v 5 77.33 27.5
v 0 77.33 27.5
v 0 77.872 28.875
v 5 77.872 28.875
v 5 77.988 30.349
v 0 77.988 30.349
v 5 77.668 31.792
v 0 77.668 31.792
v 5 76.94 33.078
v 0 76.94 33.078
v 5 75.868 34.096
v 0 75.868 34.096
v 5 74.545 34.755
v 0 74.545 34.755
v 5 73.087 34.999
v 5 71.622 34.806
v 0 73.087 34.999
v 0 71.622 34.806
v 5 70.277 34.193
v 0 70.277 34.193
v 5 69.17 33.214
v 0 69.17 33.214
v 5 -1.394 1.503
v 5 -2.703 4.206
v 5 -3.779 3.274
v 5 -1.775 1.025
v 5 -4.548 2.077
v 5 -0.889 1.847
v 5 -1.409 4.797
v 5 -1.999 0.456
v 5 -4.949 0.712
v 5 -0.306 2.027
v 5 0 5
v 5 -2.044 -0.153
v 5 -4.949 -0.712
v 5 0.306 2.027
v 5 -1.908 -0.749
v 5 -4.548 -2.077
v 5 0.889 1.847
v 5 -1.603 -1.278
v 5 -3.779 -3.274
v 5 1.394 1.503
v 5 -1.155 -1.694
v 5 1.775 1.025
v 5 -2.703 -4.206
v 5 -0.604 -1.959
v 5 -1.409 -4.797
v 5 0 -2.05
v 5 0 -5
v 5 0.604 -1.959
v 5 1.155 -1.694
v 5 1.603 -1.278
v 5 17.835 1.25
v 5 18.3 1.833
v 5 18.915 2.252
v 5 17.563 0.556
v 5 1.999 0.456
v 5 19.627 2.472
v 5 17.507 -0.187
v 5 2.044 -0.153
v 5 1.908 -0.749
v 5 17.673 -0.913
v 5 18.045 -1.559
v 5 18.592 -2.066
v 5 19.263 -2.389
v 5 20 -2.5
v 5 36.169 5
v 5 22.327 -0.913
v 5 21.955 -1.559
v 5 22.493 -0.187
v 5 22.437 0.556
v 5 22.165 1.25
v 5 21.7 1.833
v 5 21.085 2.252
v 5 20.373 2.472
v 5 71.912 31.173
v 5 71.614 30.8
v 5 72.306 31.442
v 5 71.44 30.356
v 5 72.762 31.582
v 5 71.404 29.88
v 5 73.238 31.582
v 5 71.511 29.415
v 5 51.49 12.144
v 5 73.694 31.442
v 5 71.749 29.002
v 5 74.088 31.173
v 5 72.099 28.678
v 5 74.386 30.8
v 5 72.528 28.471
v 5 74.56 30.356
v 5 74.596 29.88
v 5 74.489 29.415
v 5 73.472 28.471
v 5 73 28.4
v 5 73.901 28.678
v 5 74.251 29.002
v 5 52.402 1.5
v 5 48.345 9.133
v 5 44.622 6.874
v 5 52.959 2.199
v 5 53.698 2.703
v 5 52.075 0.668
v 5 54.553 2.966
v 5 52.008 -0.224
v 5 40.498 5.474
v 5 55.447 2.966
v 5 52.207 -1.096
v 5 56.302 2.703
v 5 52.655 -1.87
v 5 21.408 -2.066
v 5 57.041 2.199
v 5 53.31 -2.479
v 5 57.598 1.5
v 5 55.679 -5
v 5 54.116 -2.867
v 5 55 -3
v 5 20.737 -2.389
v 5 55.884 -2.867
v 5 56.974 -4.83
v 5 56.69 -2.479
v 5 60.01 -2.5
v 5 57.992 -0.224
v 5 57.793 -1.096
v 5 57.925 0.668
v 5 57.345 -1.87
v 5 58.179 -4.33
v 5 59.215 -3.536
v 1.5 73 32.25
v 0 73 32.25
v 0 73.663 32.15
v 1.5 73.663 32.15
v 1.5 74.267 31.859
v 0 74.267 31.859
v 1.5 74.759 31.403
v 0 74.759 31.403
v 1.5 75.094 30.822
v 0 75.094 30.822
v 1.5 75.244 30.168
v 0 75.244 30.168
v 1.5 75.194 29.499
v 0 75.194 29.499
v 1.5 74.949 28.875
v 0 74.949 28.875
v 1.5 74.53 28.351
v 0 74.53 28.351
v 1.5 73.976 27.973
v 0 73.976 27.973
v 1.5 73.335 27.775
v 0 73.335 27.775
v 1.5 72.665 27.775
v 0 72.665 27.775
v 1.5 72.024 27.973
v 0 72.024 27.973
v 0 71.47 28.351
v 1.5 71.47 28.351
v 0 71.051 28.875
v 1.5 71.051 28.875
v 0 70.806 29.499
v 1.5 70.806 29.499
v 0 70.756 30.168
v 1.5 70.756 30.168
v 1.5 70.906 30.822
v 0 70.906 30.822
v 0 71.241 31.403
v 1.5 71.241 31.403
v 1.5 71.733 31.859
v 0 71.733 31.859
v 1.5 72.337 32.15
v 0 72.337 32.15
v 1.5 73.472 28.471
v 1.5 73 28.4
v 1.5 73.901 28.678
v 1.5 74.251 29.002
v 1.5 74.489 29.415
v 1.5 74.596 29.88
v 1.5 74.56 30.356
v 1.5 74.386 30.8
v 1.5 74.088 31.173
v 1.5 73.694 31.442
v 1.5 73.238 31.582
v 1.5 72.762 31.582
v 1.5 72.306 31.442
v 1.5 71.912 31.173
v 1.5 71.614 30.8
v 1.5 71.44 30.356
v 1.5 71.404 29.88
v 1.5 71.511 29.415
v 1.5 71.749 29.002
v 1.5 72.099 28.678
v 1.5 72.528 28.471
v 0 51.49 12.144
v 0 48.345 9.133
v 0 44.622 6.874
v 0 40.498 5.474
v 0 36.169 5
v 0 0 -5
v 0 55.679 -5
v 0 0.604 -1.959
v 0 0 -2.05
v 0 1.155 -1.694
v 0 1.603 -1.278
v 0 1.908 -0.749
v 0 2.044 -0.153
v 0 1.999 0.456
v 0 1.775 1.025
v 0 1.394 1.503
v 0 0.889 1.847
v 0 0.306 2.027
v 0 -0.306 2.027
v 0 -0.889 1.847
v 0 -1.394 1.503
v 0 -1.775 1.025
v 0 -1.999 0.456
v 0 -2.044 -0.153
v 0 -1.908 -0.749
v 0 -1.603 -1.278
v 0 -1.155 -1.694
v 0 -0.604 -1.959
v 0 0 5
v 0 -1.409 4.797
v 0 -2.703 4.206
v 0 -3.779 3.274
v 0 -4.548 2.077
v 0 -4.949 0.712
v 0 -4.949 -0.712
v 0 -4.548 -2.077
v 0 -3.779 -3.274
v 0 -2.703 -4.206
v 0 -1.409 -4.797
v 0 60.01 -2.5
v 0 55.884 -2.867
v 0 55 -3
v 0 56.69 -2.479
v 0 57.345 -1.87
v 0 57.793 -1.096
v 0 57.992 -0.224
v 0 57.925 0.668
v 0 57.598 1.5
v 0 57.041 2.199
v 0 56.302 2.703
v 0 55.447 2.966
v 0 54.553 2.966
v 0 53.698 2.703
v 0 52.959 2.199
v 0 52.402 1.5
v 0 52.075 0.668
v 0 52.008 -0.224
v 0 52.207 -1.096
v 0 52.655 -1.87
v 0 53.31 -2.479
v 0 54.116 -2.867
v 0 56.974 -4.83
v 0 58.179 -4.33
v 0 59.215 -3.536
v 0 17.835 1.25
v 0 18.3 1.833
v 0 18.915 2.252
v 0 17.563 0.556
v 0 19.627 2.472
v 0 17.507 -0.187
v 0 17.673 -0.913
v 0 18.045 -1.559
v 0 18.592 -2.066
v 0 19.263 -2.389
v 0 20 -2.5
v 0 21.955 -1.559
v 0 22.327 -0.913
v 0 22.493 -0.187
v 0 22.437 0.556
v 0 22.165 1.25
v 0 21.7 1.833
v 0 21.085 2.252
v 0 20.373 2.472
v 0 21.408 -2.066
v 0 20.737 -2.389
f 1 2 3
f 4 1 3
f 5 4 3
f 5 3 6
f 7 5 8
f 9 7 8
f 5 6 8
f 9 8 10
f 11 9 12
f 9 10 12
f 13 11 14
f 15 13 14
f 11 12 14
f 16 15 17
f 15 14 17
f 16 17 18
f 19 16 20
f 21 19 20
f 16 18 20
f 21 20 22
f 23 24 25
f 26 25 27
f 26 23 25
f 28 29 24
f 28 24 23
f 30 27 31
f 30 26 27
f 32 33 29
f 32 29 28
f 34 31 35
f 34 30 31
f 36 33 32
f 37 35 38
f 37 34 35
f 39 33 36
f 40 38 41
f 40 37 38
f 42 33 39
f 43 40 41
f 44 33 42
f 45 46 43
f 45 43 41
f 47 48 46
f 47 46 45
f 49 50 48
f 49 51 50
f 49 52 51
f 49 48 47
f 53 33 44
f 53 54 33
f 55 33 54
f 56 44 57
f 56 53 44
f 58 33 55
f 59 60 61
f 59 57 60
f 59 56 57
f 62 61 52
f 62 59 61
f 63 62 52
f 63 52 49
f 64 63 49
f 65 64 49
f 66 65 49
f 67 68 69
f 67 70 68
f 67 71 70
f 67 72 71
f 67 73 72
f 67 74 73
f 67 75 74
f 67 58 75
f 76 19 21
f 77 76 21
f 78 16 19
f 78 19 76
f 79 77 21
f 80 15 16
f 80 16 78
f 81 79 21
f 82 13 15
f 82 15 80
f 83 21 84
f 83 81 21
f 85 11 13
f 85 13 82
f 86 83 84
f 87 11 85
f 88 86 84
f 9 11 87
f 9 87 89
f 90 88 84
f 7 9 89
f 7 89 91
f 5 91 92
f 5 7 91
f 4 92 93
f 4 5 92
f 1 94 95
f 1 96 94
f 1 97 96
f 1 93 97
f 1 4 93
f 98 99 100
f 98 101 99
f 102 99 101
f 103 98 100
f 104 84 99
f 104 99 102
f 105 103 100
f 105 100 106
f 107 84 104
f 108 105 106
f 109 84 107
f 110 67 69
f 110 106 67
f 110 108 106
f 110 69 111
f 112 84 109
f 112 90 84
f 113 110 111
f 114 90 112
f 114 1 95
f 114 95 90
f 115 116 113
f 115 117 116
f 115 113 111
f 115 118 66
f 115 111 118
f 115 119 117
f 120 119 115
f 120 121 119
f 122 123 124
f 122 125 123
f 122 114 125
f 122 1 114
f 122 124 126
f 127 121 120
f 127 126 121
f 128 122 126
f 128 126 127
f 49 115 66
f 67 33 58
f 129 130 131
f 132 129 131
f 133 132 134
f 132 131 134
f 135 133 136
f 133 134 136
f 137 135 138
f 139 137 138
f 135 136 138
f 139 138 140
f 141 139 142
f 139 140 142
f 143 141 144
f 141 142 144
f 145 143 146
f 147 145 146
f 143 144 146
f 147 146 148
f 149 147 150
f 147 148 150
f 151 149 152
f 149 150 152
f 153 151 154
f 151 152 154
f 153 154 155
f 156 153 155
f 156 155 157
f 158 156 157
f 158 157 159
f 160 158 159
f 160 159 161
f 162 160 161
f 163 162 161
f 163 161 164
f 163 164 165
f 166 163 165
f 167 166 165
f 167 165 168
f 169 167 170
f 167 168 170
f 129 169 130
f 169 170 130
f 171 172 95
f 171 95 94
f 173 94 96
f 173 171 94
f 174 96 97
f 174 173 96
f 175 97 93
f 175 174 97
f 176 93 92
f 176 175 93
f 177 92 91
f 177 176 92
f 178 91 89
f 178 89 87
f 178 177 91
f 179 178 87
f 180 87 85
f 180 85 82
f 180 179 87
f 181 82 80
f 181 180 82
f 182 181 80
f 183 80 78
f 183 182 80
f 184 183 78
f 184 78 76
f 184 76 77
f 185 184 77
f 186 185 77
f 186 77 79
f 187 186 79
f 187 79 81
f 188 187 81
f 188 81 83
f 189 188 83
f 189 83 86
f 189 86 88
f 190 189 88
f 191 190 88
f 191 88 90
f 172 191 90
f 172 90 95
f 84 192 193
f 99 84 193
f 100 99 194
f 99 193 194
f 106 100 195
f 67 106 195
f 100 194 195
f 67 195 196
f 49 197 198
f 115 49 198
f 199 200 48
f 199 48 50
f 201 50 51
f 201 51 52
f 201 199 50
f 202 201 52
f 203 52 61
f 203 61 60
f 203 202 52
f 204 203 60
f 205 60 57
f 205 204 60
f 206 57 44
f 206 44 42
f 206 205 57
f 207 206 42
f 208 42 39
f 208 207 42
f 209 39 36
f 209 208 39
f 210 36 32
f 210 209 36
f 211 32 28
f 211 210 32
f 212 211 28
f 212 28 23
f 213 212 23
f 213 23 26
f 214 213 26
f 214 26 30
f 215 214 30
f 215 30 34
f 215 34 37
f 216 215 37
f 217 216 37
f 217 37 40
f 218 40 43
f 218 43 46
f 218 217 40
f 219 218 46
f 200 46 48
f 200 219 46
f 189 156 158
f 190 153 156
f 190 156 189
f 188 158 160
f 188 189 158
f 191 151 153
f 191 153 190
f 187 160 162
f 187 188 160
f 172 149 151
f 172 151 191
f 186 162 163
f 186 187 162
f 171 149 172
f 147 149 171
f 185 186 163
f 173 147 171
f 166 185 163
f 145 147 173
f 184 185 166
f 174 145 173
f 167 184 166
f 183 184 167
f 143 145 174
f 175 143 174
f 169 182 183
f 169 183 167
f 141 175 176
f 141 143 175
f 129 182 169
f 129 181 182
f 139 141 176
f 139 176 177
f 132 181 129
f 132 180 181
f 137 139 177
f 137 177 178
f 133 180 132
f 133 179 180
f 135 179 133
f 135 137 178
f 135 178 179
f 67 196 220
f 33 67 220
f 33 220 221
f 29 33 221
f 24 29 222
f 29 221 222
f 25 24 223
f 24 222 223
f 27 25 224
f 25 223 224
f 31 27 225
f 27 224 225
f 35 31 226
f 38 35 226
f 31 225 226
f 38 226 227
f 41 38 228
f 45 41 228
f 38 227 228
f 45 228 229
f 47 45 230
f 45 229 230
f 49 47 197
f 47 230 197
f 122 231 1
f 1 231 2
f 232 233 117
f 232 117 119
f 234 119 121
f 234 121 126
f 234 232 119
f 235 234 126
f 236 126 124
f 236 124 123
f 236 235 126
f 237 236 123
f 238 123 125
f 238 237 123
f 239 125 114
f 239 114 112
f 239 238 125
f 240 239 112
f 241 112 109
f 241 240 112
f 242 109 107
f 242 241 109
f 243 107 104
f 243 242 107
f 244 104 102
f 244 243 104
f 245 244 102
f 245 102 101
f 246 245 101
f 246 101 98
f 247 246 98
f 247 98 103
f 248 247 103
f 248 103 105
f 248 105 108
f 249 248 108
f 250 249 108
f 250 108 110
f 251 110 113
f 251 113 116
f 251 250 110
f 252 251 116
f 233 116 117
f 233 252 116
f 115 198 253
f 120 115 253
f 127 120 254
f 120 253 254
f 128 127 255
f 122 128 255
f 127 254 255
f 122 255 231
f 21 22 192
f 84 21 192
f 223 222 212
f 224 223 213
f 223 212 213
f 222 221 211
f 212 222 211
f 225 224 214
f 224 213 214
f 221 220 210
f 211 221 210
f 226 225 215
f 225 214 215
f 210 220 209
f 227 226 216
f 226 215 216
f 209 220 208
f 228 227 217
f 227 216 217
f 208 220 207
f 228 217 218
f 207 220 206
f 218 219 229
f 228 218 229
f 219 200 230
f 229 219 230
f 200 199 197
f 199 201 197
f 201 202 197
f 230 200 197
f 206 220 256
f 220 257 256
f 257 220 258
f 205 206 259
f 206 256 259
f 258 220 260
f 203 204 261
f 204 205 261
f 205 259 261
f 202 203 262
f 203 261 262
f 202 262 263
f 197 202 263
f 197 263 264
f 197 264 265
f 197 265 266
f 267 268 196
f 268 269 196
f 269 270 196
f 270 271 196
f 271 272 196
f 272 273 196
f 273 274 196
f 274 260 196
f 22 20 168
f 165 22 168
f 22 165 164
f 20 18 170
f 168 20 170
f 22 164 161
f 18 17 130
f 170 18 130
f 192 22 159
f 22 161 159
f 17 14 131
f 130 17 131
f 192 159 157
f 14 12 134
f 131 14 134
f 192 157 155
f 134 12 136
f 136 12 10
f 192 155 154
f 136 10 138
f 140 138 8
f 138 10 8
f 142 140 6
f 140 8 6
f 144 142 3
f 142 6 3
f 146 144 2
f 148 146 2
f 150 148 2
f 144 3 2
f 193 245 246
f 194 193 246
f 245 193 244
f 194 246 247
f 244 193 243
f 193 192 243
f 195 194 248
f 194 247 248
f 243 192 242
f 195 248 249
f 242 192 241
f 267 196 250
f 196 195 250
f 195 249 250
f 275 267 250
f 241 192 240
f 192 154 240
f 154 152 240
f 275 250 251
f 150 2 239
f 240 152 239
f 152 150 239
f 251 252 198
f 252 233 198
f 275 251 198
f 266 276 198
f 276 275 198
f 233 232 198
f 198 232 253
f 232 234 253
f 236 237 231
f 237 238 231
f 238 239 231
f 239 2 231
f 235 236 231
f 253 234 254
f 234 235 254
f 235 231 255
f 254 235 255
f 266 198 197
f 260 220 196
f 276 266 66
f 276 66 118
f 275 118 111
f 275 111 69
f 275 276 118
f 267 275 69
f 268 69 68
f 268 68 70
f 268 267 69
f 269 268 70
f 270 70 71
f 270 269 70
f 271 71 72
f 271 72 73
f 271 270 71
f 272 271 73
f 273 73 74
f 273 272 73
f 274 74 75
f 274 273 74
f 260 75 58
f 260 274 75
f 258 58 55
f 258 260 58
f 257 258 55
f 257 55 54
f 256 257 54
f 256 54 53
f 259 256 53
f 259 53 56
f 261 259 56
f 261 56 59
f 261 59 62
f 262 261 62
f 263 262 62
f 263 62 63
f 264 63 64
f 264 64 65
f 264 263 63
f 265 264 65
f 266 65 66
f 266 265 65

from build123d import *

# Parameters (mm, degrees)
SKETCH_1_R          = 2.05
SKETCH_1_R_2        = 2.5
SKETCH_1_R_3        = 3
SKETCH_1_R_4        = 1.6
EXTRUDE_1_DEPTH     = 5
SKETCH_2_R          = 2.25
CUT_EXTRUDE_1_DEPTH = 1.5


with BuildPart() as part:
    # 草图1 → 凸台-拉伸1 (new body)
    with BuildSketch(Plane(origin=(0, 0, 0), x_dir=(0, 0, -1), z_dir=(1, 0, 0))):
        with BuildLine():
            Line((5, 0), (5, 55.679491924))
            ThreePointArc((5, 55.679491924), (4.330127019, 58.179491924), (2.5, 60.009618943))
            Line((2.5, 60.009618943), (-27.5, 77.330127019))
            ThreePointArc((-27.5, 77.330127019), (-34.095760221, 75.867882182), (-33.213938048, 69.169777784))
            Line((-33.213938048, 69.169777784), (-12.144247806, 51.490208473))
            ThreePointArc((-12.144247806, 51.490208473), (-6.873844259, 44.621684846), (-5, 36.169319611))
            Line((-5, 36.169319611), (-5, 0))
            ThreePointArc((-5, 0), (0, -5), (5, 0))
        make_face()
        Circle(SKETCH_1_R, mode=Mode.SUBTRACT)
        with Locations((0, 20)):
            Circle(SKETCH_1_R_2, mode=Mode.SUBTRACT)
        with Locations((0, 55)):
            Circle(SKETCH_1_R_3, mode=Mode.SUBTRACT)
        with Locations((-30, 73)):
            Circle(SKETCH_1_R_4, mode=Mode.SUBTRACT)
    extrude(amount=EXTRUDE_1_DEPTH)

    # 草图2 → 切除-拉伸1 (cut)
    with BuildSketch(Plane.ZY):
        with Locations((30, 73)):
            Circle(SKETCH_2_R)
    extrude(amount=-CUT_EXTRUDE_1_DEPTH, mode=Mode.SUBTRACT)


solid = part.part
